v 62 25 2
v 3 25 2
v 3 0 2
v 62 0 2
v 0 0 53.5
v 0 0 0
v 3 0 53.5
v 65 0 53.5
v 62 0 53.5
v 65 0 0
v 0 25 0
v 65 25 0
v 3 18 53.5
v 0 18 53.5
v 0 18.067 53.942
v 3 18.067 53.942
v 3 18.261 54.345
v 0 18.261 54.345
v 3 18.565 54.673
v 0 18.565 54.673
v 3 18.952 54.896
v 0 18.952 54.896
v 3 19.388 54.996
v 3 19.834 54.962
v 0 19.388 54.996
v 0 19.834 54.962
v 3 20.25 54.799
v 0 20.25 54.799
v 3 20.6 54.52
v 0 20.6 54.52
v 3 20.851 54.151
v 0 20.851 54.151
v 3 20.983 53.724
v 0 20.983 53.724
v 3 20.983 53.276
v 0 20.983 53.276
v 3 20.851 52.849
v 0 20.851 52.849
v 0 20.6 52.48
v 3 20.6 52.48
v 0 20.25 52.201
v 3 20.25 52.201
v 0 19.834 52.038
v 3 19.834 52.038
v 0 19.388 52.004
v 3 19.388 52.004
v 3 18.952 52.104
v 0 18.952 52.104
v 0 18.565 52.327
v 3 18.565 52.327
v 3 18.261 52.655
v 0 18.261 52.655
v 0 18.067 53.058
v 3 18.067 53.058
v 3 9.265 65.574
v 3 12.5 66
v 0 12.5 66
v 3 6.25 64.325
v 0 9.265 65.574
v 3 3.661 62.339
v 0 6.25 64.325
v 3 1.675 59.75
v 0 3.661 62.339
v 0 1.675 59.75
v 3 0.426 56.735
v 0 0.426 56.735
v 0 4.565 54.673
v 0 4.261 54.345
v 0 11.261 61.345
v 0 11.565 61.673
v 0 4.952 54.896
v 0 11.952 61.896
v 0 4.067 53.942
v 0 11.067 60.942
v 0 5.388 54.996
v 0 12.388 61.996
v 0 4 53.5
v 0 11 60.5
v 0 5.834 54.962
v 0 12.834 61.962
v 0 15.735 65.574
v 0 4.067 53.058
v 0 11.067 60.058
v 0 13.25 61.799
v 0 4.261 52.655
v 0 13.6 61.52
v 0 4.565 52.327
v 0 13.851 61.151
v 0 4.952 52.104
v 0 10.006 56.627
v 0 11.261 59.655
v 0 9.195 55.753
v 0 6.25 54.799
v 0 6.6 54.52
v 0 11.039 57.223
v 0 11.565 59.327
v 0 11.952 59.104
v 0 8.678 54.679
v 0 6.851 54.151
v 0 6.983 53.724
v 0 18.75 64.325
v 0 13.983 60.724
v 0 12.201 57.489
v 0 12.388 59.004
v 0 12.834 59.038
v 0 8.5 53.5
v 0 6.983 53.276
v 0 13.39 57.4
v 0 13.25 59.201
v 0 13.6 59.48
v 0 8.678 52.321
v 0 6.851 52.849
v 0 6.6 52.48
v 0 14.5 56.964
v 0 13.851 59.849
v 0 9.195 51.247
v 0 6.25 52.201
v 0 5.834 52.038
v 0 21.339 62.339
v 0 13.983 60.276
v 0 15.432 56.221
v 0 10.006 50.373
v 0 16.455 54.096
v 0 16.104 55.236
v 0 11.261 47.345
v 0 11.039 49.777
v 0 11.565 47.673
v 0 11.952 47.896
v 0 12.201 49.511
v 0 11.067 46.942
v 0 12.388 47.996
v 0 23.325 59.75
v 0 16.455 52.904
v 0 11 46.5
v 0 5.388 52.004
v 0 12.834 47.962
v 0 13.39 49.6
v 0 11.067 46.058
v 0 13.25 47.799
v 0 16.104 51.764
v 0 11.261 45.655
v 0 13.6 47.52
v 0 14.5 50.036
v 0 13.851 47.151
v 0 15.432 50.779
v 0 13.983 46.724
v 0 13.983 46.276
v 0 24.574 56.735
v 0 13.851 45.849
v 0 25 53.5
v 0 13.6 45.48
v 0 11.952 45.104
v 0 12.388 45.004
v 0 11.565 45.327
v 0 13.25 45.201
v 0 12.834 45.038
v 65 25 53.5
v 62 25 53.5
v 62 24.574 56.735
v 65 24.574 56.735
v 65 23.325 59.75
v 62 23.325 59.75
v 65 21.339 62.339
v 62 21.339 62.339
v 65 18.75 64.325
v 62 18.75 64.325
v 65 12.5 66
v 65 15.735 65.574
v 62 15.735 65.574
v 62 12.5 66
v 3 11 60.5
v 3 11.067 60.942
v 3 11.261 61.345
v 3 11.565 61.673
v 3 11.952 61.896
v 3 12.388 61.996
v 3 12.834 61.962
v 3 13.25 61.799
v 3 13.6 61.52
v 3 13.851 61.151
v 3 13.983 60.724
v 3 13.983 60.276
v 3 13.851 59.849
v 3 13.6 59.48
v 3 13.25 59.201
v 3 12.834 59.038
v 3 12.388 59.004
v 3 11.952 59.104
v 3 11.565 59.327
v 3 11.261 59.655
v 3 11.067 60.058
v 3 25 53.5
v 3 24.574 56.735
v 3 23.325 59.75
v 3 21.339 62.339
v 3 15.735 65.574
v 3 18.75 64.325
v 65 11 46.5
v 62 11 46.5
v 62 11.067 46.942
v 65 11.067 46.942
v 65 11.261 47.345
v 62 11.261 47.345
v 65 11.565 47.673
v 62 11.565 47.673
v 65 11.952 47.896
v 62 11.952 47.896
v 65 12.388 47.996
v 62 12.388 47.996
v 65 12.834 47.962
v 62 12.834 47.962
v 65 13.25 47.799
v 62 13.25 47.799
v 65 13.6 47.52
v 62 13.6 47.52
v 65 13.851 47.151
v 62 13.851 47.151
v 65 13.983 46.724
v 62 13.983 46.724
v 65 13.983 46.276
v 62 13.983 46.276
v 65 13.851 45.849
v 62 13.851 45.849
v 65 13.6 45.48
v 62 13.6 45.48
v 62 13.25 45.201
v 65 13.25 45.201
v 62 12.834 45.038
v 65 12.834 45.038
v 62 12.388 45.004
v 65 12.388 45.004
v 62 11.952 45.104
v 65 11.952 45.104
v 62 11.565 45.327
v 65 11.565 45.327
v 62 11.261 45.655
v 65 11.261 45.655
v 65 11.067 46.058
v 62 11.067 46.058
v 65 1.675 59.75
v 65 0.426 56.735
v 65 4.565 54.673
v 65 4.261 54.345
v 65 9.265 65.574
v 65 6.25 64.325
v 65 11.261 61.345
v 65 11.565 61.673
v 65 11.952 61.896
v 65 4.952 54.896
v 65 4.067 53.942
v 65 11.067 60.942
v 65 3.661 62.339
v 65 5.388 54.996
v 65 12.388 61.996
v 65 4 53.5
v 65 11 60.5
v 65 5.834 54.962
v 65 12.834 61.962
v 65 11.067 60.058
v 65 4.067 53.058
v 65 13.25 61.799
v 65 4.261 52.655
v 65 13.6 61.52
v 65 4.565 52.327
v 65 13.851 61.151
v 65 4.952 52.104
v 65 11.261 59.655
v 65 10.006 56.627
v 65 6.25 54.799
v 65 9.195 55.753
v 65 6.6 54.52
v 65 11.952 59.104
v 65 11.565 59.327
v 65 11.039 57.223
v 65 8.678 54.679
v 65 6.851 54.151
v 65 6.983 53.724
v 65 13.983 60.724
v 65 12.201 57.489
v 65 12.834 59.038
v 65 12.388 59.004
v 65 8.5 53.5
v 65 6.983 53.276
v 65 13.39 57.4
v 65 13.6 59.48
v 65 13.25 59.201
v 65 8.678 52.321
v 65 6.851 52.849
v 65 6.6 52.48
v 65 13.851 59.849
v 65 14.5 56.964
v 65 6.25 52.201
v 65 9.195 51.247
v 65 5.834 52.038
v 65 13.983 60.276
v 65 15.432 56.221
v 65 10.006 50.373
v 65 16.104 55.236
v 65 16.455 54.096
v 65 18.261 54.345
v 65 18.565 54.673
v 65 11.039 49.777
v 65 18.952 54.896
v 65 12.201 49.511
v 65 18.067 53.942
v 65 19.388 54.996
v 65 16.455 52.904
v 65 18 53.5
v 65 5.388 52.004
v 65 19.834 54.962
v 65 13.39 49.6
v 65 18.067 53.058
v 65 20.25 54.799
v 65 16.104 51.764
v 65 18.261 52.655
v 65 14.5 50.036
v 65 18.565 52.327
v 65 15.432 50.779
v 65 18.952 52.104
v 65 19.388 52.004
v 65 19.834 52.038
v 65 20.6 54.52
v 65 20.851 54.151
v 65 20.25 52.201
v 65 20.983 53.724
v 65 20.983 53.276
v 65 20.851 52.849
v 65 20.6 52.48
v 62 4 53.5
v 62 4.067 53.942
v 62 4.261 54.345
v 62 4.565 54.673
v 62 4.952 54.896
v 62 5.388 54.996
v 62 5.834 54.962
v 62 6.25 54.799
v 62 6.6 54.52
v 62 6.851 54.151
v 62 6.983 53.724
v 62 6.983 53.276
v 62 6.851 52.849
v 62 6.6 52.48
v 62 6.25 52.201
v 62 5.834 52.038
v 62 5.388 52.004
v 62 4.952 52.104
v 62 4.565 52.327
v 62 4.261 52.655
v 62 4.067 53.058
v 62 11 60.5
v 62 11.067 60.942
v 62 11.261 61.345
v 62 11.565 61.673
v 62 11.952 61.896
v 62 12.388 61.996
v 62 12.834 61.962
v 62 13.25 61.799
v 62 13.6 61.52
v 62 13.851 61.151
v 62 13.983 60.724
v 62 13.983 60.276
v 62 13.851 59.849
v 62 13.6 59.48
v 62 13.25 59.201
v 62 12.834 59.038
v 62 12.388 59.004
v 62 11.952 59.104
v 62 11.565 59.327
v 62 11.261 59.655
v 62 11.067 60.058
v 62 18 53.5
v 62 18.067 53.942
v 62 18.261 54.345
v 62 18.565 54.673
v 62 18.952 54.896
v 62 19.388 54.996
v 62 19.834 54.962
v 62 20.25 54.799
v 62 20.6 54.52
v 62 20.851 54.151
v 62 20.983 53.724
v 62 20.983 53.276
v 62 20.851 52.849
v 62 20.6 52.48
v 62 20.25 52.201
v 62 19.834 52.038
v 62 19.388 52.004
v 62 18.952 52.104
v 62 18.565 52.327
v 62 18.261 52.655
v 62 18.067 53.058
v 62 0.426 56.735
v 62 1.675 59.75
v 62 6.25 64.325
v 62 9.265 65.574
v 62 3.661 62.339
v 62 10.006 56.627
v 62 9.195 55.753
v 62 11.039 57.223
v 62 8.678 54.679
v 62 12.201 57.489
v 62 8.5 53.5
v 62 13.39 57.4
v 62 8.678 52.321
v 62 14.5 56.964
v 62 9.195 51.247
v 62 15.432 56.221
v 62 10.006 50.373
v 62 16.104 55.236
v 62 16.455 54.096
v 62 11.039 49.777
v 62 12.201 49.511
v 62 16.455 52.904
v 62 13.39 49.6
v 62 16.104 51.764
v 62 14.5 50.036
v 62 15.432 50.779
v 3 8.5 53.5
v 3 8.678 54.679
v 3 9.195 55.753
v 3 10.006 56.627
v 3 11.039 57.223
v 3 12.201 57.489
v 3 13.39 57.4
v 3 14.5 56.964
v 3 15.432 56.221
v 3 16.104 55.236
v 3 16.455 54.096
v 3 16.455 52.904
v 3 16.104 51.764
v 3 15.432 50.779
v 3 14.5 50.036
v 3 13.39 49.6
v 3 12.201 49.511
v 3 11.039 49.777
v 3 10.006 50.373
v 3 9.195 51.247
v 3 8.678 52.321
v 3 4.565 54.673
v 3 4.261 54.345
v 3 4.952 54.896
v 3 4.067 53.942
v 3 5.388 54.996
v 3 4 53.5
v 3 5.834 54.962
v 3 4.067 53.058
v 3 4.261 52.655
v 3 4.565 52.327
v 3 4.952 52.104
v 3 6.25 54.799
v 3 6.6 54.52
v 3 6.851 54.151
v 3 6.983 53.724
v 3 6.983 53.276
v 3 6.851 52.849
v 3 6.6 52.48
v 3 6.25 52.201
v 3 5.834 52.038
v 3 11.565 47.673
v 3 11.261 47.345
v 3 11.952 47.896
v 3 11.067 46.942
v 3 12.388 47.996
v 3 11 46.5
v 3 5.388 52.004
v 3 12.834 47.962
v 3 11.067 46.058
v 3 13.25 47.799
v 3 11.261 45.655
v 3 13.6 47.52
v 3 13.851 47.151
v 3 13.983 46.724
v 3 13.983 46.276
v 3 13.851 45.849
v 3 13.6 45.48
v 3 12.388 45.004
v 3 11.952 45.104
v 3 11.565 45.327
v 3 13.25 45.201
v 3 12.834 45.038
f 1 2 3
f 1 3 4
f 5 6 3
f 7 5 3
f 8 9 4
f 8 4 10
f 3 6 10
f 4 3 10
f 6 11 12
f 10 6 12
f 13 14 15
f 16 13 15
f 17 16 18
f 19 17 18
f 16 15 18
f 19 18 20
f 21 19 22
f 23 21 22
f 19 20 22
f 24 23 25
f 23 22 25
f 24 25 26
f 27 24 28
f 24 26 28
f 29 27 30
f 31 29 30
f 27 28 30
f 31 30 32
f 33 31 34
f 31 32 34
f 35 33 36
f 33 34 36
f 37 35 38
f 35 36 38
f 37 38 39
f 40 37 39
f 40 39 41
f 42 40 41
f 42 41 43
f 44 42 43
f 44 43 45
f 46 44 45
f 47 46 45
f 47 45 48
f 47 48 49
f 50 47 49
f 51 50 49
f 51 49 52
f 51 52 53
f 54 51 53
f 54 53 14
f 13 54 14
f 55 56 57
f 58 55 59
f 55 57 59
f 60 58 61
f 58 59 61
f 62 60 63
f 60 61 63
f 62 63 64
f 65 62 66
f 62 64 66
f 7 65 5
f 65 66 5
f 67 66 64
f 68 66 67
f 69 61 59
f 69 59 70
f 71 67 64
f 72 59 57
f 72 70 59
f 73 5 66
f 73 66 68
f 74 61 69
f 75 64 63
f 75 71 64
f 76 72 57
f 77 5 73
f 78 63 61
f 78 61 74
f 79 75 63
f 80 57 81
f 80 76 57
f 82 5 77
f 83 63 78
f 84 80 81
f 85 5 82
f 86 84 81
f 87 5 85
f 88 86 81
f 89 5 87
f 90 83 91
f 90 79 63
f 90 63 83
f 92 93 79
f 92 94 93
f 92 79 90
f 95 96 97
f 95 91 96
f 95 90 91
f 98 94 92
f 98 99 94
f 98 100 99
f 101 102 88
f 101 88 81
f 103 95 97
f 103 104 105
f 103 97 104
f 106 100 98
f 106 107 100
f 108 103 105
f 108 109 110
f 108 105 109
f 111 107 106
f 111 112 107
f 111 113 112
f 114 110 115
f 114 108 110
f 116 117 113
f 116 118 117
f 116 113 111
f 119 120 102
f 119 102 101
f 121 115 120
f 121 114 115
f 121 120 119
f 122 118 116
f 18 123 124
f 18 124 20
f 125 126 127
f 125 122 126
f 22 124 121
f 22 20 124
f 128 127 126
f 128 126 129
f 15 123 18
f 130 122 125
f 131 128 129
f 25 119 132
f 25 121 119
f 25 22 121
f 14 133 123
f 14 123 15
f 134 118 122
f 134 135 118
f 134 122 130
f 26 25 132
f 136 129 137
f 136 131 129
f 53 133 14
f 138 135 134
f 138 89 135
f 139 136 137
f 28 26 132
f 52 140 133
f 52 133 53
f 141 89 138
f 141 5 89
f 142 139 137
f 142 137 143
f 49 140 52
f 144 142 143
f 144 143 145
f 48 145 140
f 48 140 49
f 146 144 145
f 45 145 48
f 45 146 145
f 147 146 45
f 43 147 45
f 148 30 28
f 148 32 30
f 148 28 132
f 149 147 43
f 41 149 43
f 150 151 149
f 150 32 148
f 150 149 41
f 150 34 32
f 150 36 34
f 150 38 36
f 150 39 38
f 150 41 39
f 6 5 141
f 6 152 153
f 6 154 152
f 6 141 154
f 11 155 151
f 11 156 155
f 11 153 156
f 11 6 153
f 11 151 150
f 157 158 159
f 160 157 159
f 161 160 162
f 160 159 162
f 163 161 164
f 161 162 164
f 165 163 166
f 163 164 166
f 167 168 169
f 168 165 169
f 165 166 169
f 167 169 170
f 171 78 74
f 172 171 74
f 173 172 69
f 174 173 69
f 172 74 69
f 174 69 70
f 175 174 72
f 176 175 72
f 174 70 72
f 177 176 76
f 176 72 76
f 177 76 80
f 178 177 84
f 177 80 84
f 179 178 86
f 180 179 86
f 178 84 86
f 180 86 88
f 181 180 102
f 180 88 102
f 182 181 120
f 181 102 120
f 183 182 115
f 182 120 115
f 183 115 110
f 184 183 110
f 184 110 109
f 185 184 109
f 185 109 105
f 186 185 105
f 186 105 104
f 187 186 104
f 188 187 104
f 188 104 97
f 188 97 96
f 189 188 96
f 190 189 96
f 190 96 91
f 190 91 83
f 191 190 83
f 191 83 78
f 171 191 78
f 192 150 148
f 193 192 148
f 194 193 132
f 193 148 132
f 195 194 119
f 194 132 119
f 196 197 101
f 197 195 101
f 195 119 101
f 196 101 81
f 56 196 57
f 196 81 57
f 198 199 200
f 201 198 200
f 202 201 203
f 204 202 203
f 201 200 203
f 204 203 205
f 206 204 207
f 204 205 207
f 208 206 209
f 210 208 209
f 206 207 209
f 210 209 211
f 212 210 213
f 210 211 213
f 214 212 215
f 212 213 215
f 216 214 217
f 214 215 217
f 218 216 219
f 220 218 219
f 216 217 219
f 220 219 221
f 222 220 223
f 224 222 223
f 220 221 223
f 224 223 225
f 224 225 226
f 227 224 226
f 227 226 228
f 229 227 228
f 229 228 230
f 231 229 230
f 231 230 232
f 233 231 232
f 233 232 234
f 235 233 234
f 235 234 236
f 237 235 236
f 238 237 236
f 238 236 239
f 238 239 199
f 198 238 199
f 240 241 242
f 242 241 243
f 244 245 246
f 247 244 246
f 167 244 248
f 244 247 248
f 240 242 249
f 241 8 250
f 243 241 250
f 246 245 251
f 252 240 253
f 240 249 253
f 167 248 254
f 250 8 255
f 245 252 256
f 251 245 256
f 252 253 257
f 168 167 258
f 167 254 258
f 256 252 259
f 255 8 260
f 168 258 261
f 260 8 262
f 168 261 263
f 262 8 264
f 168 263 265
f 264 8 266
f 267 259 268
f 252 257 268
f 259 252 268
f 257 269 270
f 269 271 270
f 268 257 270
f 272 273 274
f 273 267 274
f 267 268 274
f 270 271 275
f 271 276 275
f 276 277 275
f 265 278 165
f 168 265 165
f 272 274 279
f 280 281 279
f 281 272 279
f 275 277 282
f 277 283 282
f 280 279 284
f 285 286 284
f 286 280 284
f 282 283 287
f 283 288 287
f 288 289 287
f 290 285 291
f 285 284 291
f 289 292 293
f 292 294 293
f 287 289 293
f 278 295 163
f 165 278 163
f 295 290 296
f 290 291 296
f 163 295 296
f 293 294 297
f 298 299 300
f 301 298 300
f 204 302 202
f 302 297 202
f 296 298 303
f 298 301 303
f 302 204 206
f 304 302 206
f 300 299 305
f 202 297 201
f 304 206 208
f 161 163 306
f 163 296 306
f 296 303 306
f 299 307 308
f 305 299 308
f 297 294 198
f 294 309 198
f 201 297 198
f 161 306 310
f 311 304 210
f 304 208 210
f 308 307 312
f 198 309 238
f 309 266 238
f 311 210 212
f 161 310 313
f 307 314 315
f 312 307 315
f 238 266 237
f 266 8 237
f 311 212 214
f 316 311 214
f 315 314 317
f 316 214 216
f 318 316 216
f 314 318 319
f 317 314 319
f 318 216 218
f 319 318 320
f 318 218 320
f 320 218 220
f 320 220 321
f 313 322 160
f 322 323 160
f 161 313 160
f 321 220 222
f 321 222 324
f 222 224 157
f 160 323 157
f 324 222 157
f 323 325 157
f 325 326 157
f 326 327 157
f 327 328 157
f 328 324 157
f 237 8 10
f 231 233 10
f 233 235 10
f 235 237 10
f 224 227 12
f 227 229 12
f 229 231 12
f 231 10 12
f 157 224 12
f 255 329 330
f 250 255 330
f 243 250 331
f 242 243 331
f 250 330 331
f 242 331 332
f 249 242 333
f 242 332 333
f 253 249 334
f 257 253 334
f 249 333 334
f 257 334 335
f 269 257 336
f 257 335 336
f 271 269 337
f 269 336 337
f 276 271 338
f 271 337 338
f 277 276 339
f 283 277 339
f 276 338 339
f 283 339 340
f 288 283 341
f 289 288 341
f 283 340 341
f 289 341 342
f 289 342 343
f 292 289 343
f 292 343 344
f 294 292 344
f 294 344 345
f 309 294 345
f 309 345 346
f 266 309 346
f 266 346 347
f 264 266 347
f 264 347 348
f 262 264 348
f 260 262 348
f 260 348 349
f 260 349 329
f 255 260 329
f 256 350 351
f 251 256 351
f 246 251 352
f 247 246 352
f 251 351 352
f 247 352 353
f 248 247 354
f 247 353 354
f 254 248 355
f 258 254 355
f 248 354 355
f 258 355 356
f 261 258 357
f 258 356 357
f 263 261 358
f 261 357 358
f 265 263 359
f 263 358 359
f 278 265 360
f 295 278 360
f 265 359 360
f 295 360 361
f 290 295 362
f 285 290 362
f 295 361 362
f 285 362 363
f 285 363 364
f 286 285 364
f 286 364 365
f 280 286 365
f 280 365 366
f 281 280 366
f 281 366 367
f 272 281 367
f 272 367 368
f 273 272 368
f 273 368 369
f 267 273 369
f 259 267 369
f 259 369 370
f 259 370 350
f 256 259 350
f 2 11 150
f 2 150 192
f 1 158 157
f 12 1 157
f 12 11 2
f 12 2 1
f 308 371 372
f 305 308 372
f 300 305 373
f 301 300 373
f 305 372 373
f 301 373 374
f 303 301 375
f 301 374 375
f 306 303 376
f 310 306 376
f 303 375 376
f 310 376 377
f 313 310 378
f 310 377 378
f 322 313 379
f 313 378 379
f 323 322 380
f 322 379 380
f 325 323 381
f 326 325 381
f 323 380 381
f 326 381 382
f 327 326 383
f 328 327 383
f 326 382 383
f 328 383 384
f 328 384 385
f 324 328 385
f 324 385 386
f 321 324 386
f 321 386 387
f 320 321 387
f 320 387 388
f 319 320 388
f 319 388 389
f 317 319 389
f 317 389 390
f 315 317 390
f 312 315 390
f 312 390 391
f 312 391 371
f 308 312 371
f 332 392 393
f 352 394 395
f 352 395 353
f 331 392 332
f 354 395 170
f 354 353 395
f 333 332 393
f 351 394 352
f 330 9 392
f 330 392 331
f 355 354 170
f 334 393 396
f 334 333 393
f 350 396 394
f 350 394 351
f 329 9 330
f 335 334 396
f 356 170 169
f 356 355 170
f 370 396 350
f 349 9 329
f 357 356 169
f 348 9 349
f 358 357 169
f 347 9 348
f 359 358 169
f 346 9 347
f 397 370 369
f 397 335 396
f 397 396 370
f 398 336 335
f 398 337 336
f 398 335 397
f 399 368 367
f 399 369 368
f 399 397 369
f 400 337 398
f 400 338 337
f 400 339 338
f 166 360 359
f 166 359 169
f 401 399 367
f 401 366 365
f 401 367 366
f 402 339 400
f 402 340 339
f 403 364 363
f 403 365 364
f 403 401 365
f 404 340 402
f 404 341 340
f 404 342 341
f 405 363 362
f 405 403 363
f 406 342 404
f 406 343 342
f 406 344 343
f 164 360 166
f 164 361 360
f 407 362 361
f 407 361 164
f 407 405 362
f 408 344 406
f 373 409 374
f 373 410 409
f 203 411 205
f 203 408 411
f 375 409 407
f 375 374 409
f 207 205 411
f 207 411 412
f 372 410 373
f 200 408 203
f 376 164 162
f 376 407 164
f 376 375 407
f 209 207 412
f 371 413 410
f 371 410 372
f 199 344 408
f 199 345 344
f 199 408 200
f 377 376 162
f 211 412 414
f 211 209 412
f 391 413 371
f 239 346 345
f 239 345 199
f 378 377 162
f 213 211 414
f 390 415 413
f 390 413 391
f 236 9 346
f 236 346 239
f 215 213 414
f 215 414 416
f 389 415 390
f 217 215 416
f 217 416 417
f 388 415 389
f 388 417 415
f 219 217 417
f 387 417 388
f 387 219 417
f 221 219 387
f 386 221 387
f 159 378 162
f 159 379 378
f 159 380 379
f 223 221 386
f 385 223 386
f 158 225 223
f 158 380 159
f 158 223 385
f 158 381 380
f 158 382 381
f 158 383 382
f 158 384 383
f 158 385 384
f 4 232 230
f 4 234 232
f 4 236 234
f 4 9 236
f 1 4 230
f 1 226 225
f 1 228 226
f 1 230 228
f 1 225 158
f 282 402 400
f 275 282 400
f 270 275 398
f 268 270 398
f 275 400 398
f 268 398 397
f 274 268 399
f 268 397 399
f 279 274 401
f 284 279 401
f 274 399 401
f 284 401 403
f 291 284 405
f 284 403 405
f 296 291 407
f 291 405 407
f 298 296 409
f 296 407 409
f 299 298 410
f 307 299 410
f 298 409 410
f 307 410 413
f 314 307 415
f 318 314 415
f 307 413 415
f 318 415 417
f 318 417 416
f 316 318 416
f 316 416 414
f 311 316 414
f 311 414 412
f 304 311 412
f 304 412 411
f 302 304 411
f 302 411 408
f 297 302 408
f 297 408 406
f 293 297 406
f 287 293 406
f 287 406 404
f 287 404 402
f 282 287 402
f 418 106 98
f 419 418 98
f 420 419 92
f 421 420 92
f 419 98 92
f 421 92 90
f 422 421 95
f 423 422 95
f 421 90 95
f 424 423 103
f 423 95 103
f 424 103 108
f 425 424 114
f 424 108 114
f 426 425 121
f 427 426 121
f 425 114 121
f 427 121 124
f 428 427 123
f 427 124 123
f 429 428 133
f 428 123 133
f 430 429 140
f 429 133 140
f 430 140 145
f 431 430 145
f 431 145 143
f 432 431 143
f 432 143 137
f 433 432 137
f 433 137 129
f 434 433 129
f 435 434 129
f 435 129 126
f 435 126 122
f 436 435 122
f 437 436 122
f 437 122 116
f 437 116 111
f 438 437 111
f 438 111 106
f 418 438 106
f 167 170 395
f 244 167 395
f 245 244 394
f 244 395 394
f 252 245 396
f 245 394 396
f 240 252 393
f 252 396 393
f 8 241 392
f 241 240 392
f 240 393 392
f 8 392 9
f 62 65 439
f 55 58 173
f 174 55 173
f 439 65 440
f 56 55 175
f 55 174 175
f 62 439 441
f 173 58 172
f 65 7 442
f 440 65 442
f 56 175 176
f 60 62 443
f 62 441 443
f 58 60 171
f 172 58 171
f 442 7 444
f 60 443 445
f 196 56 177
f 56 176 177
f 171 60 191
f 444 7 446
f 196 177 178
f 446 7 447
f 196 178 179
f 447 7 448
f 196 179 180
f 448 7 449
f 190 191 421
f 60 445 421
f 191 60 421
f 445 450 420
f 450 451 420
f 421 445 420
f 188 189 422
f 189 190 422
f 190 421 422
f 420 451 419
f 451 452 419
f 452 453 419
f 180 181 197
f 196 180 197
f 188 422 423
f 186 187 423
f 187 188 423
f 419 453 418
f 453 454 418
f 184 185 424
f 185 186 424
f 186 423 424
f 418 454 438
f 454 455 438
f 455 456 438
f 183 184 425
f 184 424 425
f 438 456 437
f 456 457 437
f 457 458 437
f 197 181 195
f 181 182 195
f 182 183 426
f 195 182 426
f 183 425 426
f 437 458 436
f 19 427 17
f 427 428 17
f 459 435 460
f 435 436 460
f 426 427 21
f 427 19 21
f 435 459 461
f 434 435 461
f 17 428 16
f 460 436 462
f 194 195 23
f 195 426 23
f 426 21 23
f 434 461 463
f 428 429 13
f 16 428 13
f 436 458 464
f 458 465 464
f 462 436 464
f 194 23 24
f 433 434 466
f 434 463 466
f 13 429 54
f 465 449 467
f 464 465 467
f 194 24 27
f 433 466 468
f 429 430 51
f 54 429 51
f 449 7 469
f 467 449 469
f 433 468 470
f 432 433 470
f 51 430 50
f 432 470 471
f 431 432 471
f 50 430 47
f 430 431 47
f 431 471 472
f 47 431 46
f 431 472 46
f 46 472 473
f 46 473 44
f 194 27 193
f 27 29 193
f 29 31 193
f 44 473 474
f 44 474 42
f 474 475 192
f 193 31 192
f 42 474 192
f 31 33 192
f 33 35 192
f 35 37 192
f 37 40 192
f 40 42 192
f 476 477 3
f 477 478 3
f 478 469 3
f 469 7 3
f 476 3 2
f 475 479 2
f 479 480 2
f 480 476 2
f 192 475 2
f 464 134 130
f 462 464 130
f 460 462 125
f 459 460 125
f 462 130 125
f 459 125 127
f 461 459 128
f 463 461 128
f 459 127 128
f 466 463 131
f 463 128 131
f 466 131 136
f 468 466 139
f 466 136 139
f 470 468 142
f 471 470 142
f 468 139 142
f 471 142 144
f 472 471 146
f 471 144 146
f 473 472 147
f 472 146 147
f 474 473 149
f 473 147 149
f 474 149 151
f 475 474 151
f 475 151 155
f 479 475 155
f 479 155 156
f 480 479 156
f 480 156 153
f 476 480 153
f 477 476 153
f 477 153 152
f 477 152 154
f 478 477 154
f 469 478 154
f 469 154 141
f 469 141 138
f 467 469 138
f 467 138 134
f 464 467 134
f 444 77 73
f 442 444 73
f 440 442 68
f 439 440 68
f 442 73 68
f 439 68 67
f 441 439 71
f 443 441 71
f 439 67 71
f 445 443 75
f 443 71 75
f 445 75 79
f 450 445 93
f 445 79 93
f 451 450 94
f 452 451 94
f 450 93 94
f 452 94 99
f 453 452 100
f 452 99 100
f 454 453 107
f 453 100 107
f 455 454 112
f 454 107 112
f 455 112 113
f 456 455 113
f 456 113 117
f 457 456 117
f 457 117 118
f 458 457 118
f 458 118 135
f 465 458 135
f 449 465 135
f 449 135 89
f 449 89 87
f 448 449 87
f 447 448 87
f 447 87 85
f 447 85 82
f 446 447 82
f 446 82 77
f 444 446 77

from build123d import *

# Parameters (mm, degrees)
F0_W     = 65
F0_H     = 25
F1_DEPTH = 2
F2_W     = 3
F2_H     = 25
F3_DEPTH = 66
F4_R     = 4
F4_R_2   = 1.5
F5_DEPTH = 65.001


with BuildPart() as f1:
    # F0 (on Top) → F1 (new body)
    with BuildSketch(Plane.XY):
        with Locations((32.5, 12.5)):
            Rectangle(F0_W, F0_H)
    extrude(amount=F1_DEPTH)

    # F2 (on Top) → F3 (join)
    with BuildSketch(Plane.XY):
        with Locations((1.5, 12.5)):
            Rectangle(F2_W, F2_H)
        with Locations((63.5, 12.5)):
            Rectangle(F2_W, F2_H)
    extrude(amount=F3_DEPTH)

    # F4 (on face) → F5 (cut, through all)
    with BuildSketch(Plane(origin=(0, 0, 0), x_dir=(0, -1, 0), z_dir=(-1, 0, 0))):
        with BuildLine():
            ThreePointArc((-25, 53.5), (-21.338835, 62.338835), (-12.5, 66))
            Line((-12.5, 66), (-25, 66))
            Line((-25, 66), (-25, 53.5))
        make_face()
        with BuildLine():
            ThreePointArc((-12.5, 66), (-3.661165, 62.338835), (0, 53.5))
            Line((0, 53.5), (0, 66))
            Line((0, 66), (-12.5, 66))
        make_face()
        with Locations((-12.5, 53.5)):
            Circle(F4_R)
        with Locations((-12.5, 60.5)):
            Circle(F4_R_2)
        with Locations((-19.5, 53.5)):
            Circle(F4_R_2)
        with Locations((-12.5, 46.5)):
            Circle(F4_R_2)
        with Locations((-5.5, 53.5)):
            Circle(F4_R_2)
    extrude(amount=-F5_DEPTH, mode=Mode.SUBTRACT)


solid = f1.part
